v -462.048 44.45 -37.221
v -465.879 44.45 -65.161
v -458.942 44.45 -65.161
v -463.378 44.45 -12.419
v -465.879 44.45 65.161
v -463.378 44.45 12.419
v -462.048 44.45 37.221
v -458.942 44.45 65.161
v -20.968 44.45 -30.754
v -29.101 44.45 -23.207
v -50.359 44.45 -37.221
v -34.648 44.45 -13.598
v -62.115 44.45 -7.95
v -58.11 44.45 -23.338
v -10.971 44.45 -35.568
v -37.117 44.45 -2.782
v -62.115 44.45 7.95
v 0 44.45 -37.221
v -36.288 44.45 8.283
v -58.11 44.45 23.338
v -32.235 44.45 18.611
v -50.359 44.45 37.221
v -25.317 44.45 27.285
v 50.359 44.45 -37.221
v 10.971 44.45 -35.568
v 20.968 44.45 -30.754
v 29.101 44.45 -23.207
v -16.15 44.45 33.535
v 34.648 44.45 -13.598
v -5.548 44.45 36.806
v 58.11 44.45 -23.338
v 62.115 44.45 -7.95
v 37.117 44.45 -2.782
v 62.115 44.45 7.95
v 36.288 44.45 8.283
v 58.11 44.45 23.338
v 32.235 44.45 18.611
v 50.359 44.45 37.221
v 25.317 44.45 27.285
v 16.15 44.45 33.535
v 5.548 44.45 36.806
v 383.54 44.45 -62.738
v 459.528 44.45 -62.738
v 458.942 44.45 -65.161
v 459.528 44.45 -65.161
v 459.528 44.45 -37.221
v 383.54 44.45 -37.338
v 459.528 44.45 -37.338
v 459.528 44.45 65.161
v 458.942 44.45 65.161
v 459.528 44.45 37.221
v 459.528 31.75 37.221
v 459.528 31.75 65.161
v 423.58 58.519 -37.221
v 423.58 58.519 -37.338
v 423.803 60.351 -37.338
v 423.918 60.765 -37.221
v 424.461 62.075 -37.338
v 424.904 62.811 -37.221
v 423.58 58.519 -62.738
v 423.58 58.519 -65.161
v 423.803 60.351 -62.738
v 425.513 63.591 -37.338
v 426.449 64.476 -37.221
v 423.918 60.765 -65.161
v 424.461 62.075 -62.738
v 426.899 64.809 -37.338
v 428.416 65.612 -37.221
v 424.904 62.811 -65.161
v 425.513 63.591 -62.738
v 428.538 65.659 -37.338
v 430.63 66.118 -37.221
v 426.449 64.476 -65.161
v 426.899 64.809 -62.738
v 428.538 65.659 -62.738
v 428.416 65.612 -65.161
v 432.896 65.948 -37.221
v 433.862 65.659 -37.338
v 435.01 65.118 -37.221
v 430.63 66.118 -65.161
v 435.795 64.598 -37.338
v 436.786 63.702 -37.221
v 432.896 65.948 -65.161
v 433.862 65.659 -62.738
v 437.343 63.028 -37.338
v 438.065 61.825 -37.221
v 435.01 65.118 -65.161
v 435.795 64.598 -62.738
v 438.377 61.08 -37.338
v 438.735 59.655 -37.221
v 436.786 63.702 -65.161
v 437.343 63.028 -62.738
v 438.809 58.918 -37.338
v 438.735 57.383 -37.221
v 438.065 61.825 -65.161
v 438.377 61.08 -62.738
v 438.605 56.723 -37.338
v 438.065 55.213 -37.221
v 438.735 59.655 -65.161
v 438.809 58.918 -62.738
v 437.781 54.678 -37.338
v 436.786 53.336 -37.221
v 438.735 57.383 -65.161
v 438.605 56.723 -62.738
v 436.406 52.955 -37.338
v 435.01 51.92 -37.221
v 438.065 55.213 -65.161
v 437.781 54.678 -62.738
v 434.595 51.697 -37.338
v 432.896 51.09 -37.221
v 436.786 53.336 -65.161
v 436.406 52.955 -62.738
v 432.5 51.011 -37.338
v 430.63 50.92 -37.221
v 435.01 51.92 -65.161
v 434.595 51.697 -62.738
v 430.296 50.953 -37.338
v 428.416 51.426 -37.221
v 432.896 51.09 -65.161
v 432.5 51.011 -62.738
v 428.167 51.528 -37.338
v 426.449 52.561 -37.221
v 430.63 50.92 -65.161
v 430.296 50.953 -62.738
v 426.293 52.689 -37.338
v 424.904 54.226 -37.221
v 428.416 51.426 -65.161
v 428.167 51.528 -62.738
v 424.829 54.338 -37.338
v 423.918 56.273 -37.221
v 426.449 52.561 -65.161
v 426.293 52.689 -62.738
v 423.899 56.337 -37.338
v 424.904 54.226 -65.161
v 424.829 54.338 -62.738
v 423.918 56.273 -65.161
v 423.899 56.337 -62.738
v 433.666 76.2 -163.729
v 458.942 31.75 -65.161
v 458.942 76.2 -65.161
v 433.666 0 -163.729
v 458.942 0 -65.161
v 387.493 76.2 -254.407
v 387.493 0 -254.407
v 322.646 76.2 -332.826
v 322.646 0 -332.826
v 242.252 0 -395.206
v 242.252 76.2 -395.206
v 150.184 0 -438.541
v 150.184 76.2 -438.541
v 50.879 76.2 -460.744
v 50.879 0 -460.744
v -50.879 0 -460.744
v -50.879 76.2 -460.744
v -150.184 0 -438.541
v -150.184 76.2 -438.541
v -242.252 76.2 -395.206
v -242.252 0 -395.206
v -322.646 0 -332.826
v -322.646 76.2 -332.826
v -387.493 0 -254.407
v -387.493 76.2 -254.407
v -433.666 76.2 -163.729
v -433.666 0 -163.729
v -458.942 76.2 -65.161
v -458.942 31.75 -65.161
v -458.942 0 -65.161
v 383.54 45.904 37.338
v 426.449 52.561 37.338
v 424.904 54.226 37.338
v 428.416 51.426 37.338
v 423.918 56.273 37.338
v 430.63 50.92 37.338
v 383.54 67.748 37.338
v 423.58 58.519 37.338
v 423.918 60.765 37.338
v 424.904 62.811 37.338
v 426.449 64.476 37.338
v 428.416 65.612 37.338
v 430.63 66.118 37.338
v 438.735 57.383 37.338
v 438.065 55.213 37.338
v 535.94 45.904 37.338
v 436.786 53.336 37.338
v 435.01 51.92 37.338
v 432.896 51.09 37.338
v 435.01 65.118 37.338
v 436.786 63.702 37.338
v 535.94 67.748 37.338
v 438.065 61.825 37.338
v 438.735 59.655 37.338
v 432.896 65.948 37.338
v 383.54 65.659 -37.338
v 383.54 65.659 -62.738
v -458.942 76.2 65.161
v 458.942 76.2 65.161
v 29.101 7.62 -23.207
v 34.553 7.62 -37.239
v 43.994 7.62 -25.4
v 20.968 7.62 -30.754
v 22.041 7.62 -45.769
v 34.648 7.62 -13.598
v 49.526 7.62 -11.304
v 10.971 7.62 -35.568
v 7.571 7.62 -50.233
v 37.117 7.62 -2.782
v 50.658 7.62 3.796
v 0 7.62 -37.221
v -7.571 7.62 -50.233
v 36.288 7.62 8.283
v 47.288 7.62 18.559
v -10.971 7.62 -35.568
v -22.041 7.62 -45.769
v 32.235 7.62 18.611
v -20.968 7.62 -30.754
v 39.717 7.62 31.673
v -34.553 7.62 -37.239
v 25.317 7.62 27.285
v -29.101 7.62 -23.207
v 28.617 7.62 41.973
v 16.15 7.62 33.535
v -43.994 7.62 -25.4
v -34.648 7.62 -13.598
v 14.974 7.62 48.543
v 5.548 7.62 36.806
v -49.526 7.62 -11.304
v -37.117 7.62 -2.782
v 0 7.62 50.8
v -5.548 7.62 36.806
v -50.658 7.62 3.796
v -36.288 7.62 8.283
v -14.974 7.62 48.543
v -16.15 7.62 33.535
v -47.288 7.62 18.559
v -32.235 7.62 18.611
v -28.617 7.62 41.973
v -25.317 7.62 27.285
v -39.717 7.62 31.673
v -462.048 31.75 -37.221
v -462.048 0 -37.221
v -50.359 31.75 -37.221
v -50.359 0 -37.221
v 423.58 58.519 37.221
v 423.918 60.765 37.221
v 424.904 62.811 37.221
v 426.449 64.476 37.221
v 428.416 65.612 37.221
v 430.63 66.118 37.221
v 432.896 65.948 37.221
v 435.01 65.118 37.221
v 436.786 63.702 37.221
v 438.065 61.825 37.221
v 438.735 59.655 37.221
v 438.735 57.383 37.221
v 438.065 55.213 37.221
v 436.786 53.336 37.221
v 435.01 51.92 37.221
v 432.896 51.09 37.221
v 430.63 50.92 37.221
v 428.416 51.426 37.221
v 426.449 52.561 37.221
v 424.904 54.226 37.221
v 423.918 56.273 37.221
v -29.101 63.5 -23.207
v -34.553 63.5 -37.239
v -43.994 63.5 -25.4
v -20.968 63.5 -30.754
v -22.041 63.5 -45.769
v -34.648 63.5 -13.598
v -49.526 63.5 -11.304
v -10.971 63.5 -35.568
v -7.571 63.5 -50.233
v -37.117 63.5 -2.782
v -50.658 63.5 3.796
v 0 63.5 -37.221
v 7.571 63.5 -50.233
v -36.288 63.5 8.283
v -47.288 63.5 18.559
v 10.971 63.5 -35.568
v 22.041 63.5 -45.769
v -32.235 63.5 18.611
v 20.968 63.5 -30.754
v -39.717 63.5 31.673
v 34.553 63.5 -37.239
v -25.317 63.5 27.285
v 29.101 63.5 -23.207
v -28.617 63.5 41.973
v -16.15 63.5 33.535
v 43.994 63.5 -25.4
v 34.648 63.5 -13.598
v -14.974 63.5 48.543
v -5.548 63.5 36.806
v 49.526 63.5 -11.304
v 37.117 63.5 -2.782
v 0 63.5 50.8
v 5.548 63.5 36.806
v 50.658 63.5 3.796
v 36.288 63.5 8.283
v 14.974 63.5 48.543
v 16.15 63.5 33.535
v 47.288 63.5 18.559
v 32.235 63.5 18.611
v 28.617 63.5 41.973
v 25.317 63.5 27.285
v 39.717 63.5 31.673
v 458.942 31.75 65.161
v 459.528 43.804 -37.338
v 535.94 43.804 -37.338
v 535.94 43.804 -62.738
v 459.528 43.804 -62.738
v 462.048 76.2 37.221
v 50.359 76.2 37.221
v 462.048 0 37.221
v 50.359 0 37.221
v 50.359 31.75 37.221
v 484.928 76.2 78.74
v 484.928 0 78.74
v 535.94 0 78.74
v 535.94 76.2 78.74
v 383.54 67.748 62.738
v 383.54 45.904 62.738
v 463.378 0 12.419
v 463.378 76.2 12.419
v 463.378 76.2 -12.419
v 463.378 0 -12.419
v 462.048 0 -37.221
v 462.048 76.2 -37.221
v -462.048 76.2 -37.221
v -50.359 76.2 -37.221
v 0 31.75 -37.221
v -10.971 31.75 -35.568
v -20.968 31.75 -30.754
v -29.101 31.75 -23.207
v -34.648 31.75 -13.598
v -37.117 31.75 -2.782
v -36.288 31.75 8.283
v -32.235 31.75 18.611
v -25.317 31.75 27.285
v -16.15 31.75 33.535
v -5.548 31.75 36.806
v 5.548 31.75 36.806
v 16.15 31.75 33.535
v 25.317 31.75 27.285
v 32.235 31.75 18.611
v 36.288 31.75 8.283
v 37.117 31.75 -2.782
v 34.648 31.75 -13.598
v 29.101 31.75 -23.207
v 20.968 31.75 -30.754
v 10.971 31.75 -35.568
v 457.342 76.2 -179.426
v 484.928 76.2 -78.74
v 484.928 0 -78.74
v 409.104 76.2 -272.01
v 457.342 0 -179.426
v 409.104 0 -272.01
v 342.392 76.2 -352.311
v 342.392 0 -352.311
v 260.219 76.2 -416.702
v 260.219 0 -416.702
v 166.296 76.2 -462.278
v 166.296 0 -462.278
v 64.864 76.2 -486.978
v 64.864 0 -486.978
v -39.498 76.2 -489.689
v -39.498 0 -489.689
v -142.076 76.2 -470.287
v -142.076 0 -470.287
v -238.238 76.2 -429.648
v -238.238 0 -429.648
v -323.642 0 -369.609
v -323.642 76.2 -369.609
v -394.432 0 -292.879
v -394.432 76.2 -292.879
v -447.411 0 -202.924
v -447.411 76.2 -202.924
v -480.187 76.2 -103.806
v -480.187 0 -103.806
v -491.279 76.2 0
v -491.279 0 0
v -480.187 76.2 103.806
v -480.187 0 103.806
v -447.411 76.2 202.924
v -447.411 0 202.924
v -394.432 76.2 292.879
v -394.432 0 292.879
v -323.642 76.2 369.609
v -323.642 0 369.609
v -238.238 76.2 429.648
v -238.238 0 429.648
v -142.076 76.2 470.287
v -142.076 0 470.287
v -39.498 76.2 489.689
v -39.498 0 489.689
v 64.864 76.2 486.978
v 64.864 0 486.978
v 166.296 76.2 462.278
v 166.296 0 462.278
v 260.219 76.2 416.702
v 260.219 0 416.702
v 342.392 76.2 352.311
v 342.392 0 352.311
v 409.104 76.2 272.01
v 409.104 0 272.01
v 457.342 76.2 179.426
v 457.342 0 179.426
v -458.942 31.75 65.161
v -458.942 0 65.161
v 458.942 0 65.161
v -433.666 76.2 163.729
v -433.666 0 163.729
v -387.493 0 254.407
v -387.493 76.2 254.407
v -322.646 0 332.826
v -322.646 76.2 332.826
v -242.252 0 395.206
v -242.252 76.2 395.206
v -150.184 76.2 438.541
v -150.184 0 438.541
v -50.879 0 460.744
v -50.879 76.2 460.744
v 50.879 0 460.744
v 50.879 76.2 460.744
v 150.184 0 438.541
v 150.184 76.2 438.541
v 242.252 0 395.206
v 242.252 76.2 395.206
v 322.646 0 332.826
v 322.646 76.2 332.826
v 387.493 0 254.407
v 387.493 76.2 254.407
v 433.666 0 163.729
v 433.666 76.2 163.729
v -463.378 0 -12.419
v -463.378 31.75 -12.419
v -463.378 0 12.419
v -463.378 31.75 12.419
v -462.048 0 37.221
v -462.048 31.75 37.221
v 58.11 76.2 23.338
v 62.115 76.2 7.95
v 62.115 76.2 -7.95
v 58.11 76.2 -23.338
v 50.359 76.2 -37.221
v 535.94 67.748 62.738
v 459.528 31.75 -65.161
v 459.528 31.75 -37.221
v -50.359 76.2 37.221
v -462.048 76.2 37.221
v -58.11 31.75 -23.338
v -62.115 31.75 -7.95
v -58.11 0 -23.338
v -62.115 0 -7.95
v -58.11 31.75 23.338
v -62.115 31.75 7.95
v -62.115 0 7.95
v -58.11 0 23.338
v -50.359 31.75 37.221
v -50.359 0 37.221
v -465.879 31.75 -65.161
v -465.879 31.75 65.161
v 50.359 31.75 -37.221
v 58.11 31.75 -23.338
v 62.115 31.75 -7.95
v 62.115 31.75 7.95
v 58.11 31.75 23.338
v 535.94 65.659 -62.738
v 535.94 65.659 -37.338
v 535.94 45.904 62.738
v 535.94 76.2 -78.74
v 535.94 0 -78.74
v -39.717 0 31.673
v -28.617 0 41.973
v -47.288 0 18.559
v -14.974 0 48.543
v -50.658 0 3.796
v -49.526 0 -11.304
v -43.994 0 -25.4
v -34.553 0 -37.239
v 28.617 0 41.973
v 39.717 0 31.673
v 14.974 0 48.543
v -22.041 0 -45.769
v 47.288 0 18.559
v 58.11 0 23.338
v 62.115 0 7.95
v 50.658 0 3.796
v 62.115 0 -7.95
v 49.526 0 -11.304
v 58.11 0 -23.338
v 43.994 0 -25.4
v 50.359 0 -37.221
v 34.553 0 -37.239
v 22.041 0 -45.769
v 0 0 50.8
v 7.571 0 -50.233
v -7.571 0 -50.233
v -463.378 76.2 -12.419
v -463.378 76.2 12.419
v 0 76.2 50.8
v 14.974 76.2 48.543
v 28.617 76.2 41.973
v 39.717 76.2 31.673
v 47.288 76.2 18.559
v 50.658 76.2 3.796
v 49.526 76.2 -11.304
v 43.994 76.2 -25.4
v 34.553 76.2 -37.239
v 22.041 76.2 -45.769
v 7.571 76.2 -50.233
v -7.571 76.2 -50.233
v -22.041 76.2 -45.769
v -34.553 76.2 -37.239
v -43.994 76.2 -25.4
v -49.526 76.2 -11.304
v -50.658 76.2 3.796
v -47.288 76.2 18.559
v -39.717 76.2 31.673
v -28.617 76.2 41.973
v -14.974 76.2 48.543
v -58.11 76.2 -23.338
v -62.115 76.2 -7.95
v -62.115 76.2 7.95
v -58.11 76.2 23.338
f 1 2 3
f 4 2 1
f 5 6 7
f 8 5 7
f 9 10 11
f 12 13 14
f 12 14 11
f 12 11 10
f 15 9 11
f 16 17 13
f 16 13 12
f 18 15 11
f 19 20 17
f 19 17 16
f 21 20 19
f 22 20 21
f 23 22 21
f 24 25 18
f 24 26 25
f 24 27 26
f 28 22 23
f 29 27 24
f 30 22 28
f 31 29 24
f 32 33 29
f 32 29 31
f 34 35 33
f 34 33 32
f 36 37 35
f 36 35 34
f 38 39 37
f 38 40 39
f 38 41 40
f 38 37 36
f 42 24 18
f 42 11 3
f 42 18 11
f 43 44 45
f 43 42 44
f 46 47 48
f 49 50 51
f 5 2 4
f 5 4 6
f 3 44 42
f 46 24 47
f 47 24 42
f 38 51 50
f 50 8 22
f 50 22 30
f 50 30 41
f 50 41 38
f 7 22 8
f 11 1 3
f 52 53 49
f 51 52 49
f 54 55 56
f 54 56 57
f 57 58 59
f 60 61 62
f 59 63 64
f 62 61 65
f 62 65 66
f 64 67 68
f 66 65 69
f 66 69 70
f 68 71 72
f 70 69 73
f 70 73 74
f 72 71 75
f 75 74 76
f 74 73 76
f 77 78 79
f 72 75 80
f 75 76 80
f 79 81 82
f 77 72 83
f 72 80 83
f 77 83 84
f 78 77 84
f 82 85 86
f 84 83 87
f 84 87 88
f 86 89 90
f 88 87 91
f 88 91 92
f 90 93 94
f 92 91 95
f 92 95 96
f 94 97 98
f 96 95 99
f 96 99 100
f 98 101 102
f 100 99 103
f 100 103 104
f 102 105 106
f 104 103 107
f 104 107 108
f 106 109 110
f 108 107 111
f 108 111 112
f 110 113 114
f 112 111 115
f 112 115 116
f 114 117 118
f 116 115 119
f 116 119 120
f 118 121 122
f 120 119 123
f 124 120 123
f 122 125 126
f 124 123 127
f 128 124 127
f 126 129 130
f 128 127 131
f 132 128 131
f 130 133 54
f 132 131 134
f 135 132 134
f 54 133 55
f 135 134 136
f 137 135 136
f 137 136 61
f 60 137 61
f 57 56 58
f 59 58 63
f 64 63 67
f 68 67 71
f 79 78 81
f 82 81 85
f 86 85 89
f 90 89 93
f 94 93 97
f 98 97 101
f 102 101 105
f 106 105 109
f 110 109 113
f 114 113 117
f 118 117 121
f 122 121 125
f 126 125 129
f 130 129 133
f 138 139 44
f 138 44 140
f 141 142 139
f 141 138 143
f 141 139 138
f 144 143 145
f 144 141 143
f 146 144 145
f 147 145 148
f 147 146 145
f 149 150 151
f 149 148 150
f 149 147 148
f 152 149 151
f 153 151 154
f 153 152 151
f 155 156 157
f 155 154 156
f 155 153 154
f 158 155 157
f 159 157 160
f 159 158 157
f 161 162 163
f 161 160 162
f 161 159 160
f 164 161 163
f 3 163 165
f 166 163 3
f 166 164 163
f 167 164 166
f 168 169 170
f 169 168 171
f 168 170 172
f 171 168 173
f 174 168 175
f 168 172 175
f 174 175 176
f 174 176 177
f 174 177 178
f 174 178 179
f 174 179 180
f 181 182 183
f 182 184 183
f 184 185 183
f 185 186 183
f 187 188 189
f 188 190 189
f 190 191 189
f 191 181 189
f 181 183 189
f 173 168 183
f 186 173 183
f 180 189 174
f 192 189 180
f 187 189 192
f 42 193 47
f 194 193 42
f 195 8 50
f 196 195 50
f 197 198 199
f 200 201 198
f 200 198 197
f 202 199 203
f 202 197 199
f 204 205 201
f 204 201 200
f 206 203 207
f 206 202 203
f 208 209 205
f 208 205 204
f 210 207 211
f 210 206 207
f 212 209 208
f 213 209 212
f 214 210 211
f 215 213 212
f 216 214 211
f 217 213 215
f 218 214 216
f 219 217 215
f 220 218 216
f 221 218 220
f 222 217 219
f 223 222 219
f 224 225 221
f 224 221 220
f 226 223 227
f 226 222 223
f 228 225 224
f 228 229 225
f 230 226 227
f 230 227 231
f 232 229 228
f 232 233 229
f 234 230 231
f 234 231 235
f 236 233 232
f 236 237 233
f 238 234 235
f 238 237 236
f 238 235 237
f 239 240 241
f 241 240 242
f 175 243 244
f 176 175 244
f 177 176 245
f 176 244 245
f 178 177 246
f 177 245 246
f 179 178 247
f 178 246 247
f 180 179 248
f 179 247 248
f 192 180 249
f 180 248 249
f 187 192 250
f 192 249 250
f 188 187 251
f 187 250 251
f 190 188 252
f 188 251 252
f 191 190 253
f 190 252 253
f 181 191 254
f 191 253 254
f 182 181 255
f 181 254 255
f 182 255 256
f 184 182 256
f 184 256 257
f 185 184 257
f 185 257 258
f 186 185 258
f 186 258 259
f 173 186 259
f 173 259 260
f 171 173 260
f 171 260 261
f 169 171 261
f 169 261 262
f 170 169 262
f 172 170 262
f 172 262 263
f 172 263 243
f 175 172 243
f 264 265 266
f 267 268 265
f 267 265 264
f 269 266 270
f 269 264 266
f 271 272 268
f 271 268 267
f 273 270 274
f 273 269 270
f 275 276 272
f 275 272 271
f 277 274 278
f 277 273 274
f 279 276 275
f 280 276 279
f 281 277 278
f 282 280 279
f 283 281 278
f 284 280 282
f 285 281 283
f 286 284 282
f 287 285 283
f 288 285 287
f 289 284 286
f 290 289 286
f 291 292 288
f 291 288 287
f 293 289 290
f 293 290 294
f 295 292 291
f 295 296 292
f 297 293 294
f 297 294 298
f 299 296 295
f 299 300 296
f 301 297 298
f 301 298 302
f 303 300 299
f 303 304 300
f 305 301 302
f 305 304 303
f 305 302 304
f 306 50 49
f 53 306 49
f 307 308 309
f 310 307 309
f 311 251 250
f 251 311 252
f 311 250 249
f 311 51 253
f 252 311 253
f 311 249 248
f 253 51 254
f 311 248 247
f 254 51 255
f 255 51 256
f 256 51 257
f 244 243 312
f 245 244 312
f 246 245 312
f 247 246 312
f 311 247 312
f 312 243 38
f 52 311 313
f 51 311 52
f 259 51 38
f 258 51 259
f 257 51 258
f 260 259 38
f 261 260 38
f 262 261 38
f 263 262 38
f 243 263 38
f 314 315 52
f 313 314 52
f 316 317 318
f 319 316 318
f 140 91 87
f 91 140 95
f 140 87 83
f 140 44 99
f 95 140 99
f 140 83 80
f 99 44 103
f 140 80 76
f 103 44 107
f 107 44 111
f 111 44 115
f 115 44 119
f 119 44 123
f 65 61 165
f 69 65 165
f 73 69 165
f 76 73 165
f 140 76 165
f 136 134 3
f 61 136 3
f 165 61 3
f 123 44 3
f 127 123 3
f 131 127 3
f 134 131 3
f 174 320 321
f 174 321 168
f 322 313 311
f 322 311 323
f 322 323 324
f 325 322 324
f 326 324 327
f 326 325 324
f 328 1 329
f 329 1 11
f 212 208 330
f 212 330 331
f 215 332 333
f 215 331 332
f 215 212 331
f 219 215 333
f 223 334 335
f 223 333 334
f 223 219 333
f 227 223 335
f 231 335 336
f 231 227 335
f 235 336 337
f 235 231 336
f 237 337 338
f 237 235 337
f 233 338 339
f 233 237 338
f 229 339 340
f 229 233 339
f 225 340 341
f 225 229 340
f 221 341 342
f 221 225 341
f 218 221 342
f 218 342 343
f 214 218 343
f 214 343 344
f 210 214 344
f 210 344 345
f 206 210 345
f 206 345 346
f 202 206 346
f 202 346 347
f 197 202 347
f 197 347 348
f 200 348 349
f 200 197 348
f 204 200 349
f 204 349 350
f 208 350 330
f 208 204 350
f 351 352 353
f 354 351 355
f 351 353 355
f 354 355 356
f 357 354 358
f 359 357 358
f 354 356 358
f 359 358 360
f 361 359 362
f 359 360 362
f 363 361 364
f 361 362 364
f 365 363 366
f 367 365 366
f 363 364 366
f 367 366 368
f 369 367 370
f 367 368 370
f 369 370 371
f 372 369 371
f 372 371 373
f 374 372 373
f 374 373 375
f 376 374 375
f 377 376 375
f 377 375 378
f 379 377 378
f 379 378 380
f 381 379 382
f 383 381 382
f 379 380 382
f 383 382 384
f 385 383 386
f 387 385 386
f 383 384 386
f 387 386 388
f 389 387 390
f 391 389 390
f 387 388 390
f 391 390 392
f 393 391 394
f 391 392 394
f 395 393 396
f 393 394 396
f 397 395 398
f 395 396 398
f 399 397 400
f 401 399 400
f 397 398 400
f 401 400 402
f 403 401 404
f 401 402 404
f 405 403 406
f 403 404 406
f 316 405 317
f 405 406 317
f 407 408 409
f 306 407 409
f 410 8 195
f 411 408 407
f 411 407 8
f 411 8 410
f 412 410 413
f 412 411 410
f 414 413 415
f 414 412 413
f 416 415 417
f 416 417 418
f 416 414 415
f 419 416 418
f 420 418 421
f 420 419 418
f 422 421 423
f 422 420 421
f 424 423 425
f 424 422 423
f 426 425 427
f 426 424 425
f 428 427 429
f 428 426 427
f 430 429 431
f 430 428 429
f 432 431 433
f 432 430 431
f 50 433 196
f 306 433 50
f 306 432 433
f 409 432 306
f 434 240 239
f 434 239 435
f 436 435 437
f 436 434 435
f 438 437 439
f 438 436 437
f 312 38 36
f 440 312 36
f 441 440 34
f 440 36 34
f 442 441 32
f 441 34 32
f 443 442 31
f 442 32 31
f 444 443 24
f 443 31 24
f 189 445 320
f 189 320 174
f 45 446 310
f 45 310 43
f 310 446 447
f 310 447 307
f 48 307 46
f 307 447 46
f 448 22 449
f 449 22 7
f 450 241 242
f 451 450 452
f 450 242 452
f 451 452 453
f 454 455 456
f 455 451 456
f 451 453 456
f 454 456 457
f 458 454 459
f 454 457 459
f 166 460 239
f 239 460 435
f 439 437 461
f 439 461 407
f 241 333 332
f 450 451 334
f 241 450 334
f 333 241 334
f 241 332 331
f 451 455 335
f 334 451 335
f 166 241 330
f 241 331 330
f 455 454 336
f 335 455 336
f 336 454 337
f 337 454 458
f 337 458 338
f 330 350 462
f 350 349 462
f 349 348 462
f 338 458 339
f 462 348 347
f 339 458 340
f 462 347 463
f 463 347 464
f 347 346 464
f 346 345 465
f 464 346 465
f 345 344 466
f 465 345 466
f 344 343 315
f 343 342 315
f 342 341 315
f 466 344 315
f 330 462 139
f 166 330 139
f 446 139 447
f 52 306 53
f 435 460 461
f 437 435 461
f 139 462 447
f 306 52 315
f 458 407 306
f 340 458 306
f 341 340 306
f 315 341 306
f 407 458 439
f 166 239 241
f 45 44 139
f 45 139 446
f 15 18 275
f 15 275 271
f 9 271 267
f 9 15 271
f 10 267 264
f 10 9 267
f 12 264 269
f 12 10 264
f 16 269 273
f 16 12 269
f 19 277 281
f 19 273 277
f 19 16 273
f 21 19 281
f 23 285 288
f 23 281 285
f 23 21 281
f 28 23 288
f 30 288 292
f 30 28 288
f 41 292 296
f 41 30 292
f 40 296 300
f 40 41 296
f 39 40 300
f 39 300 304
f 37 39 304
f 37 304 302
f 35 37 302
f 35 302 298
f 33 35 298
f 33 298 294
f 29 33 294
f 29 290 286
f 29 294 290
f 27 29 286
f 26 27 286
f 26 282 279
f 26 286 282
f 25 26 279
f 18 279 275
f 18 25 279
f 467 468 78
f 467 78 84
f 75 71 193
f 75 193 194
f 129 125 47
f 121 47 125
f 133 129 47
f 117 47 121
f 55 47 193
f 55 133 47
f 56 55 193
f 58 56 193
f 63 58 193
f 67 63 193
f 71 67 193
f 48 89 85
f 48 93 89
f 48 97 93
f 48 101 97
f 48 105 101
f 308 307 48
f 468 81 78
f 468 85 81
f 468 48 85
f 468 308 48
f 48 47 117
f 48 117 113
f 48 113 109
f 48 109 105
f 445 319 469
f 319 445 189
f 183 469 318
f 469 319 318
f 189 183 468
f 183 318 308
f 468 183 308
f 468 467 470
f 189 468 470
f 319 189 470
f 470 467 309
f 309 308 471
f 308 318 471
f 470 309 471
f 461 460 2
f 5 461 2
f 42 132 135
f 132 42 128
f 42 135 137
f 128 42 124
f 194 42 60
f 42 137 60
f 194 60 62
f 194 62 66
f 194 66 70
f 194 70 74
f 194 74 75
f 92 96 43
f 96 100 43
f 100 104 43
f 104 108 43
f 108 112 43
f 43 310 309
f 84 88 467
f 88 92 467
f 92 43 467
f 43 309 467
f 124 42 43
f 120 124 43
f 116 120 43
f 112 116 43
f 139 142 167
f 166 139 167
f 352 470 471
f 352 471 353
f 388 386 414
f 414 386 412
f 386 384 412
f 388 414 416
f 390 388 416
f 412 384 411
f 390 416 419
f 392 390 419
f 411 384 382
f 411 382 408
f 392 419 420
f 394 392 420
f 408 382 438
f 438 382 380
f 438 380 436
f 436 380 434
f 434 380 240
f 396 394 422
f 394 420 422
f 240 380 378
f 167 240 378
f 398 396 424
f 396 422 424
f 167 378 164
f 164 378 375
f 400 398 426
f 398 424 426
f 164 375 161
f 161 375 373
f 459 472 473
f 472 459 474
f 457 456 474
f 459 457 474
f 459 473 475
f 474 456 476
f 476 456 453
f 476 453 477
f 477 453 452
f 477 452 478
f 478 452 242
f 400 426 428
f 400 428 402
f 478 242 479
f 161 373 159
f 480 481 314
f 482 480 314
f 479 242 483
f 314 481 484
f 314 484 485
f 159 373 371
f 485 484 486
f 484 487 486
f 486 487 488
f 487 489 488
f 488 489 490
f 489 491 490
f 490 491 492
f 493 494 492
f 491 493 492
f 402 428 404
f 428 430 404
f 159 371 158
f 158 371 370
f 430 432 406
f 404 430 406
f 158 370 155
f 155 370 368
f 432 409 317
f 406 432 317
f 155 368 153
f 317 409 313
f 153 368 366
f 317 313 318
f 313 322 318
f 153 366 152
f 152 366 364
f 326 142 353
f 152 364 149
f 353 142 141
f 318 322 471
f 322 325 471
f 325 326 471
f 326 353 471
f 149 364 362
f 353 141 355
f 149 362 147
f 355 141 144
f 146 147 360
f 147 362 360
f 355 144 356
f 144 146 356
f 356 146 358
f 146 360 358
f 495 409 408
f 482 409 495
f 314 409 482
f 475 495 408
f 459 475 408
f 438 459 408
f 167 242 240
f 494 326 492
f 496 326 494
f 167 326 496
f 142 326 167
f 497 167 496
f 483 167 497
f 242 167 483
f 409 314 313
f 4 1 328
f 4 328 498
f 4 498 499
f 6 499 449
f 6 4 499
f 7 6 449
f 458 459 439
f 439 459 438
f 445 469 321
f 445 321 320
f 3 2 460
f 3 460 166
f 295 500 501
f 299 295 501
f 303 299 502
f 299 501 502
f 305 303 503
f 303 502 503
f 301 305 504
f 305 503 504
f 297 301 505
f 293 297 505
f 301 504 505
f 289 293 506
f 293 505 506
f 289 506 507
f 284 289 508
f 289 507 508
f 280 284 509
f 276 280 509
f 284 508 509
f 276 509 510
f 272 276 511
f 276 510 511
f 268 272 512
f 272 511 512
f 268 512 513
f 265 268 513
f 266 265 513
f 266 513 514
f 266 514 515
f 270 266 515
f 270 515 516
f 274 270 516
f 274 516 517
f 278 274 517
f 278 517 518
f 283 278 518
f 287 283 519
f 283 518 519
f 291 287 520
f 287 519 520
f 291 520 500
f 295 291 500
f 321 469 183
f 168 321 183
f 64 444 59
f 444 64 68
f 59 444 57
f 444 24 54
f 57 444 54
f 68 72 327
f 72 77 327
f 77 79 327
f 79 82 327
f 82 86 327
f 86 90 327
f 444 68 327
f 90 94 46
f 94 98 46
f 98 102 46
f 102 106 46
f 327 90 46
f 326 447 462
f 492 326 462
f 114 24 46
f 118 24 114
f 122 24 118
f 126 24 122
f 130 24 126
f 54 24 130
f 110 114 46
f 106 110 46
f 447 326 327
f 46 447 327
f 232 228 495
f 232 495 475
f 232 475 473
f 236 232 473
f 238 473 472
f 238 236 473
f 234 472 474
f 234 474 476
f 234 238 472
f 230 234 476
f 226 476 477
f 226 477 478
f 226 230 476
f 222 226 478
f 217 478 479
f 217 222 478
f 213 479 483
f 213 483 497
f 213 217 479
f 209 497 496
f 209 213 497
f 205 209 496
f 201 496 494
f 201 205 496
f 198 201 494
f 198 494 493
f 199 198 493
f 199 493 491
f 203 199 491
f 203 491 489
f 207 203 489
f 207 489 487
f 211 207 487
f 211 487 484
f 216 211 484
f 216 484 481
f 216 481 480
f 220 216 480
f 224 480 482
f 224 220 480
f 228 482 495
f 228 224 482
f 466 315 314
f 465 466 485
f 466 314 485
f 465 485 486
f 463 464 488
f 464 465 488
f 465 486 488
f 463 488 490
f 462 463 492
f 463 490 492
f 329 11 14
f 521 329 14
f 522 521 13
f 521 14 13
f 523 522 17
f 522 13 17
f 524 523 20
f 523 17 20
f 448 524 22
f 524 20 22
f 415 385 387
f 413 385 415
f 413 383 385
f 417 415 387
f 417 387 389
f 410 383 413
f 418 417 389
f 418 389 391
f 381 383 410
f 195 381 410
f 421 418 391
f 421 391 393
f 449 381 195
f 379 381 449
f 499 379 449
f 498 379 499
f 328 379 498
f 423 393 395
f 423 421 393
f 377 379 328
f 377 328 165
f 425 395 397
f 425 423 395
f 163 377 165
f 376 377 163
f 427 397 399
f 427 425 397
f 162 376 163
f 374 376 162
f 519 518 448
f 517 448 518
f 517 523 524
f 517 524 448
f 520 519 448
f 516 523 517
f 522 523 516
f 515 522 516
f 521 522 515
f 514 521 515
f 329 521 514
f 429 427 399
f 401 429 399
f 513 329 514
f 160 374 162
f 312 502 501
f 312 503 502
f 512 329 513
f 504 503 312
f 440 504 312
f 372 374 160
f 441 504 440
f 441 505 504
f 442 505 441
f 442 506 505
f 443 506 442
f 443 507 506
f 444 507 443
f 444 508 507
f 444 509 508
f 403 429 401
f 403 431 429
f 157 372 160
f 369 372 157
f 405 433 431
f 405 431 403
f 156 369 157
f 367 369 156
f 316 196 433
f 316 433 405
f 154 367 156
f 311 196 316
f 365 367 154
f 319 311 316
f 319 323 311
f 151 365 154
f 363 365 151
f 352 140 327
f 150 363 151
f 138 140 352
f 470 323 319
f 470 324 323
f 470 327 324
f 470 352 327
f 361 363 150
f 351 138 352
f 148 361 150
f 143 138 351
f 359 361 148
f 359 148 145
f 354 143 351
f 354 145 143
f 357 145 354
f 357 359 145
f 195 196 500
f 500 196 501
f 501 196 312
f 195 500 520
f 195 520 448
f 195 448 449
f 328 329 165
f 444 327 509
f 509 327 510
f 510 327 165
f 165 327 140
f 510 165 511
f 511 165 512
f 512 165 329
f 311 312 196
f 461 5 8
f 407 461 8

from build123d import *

# Parameters (mm, degrees)
SKETCH1_R           = 463.544695529
BOSS_EXTRUDE2_DEPTH = 76.2
EXTRUDE_THIN1_DEPTH = 76.2
SKETCH3_R           = 37.22133085
BOSS_EXTRUDE3_DEPTH = 76.2
SKETCH4_W           = 925.4067294
SKETCH4_H           = 12.7
CUT_EXTRUDE1_DEPTH  = 130.322661699
SKETCH5_R           = 50.8
CUT_EXTRUDE2_DEPTH  = 12.7
CUT_EXTRUDE3_START  = -7.62
SKETCH6_R           = 50.8
CUT_EXTRUDE3_DEPTH  = 7.62
SKETCH8_W           = 25.4
SKETCH8_H           = 21.854781484
SKETCH8_H_2         = 21.84327291
CUT_EXTRUDE4_DEPTH  = 152.4
SKETCH9_R           = 7.62
CUT_EXTRUDE5_DEPTH  = 127


# Read off the part's stored shape, not the designer's step: Extrude-Thin1
with BuildPart() as part:
    # Sketch1 → Boss-Extrude2 (new body)
    with BuildSketch(Plane(origin=(0, 0, 0), x_dir=(1, 0, 0), z_dir=(0, 1, 0))):
        with BuildLine():
            Line((533.4, -76.2), (533.4, 76.2))
            Line((533.4, 76.2), (482.762143569, 76.2))
            ThreePointArc((482.762143569, 76.2), (-488.738915233, 0), (482.762143569, -76.2))
            Line((482.762143569, -76.2), (533.4, -76.2))
        make_face()
        with Locations(Location((0, 0, 0), (0, 0, 90))):
            Circle(SKETCH1_R, mode=Mode.SUBTRACT)
    extrude(amount=BOSS_EXTRUDE2_DEPTH)

    # Extrude-Thin1 outline → Extrude-Thin1 (add)
    with BuildSketch(Plane(origin=(0, 0, 0), x_dir=(1, 0, 0), z_dir=(0, 1, 0))):
        with BuildLine():
            Line((535.94, -78.74), (535.94, 78.74))
            Line((535.94, 78.74), (484.927814167, 78.74))
            ThreePointArc((484.927814167, 78.74), (-491.278915233, 0), (484.927814167, -78.74))
            Line((484.927814167, -78.74), (535.94, -78.74))
        make_face()
        with BuildLine():
            ThreePointArc((482.762143569, -76.2), (-488.738915233, 0), (482.762143569, 76.2))
            Line((482.762143569, 76.2), (533.4, 76.2))
            Line((533.4, 76.2), (533.4, -76.2))
            Line((533.4, -76.2), (482.762143569, -76.2))
        make_face(mode=Mode.SUBTRACT)
    extrude(amount=EXTRUDE_THIN1_DEPTH)

    # Sketch3 → Boss-Extrude3 (add)
    with BuildSketch(Plane(origin=(0, 0, 0), x_dir=(1, 0, 0), z_dir=(0, 1, 0))):
        with BuildLine():
            Line((50.358749063, 37.22133085), (464.47679922, 37.22133085))
            ThreePointArc((464.47679922, 37.22133085), (463.142727121, 51.21463461), (461.387175207, 65.16133085))
            Line((461.387175207, 65.16133085), (-461.387175207, 65.16133085))
            ThreePointArc((-461.387175207, 65.16133085), (-463.142727121, 51.21463461), (-464.47679922, 37.22133085))
            Line((-464.47679922, 37.22133085), (-50.358749063, 37.22133085))
            ThreePointArc((-50.358749063, 37.22133085), (-62.62133085, 0), (-50.358749063, -37.22133085))
            Line((-50.358749063, -37.22133085), (-464.47679922, -37.22133085))
            ThreePointArc((-464.47679922, -37.22133085), (-463.142727121, -51.21463461), (-461.387175207, -65.16133085))
            Line((-461.387175207, -65.16133085), (461.387175207, -65.16133085))
            ThreePointArc((461.387175207, -65.16133085), (463.142727121, -51.21463461), (464.47679922, -37.22133085))
            Line((464.47679922, -37.22133085), (50.358749063, -37.22133085))
            ThreePointArc((50.358749063, -37.22133085), (62.62133085, 0), (50.358749063, 37.22133085))
        make_face()
        with Locations(Location((0, 0, 0), (0, 0, 90))):
            Circle(SKETCH3_R, mode=Mode.SUBTRACT)
    extrude(amount=BOSS_EXTRUDE3_DEPTH)

    # Sketch4 → Cut-Extrude1 (cut)
    with BuildSketch(Plane.XY.offset(65.16133085)):
        with Locations((-3.175550533, 38.1)):
            Rectangle(SKETCH4_W, SKETCH4_H)
    extrude(amount=-CUT_EXTRUDE1_DEPTH, mode=Mode.SUBTRACT)

    # Sketch5 → Cut-Extrude2 (cut)
    with BuildSketch(Plane(origin=(0, 76.2, 0), x_dir=(1, 0, 0), z_dir=(0, 1, 0))):
        with Locations(Location((0, 0, 0), (0, 0, 270))):
            Circle(SKETCH5_R)
    extrude(amount=-CUT_EXTRUDE2_DEPTH, mode=Mode.SUBTRACT)

    # Sketch6 → Cut-Extrude3 (cut)
    with BuildSketch(Plane.XZ.offset(CUT_EXTRUDE3_START)):
        with Locations(Location((0, 0, 0), (0, 0, 90))):
            Circle(SKETCH6_R)
    extrude(amount=CUT_EXTRUDE3_DEPTH, mode=Mode.SUBTRACT)

    # Sketch8 → Cut-Extrude4 (cut)
    with BuildSketch(Plane(origin=(535.94, 0, 0), x_dir=(0, 0, -1), z_dir=(1, 0, 0))):
        with Locations((50.038, 54.731390154)):
            Rectangle(SKETCH8_W, SKETCH8_H)
        with Locations((-50.038, 56.82595057)):
            Rectangle(SKETCH8_W, SKETCH8_H_2)
    extrude(amount=-CUT_EXTRUDE4_DEPTH, mode=Mode.SUBTRACT)

    # Sketch9 → Cut-Extrude5 (cut)
    with BuildSketch(Plane(origin=(0, 0, -65.16133085), x_dir=(-1, 0, 0), z_dir=(0, 0, -1))):
        with Locations((-431.199928215, 58.518904378)):
            Circle(SKETCH9_R)
    extrude(amount=-CUT_EXTRUDE5_DEPTH, mode=Mode.SUBTRACT)


solid = part.part
